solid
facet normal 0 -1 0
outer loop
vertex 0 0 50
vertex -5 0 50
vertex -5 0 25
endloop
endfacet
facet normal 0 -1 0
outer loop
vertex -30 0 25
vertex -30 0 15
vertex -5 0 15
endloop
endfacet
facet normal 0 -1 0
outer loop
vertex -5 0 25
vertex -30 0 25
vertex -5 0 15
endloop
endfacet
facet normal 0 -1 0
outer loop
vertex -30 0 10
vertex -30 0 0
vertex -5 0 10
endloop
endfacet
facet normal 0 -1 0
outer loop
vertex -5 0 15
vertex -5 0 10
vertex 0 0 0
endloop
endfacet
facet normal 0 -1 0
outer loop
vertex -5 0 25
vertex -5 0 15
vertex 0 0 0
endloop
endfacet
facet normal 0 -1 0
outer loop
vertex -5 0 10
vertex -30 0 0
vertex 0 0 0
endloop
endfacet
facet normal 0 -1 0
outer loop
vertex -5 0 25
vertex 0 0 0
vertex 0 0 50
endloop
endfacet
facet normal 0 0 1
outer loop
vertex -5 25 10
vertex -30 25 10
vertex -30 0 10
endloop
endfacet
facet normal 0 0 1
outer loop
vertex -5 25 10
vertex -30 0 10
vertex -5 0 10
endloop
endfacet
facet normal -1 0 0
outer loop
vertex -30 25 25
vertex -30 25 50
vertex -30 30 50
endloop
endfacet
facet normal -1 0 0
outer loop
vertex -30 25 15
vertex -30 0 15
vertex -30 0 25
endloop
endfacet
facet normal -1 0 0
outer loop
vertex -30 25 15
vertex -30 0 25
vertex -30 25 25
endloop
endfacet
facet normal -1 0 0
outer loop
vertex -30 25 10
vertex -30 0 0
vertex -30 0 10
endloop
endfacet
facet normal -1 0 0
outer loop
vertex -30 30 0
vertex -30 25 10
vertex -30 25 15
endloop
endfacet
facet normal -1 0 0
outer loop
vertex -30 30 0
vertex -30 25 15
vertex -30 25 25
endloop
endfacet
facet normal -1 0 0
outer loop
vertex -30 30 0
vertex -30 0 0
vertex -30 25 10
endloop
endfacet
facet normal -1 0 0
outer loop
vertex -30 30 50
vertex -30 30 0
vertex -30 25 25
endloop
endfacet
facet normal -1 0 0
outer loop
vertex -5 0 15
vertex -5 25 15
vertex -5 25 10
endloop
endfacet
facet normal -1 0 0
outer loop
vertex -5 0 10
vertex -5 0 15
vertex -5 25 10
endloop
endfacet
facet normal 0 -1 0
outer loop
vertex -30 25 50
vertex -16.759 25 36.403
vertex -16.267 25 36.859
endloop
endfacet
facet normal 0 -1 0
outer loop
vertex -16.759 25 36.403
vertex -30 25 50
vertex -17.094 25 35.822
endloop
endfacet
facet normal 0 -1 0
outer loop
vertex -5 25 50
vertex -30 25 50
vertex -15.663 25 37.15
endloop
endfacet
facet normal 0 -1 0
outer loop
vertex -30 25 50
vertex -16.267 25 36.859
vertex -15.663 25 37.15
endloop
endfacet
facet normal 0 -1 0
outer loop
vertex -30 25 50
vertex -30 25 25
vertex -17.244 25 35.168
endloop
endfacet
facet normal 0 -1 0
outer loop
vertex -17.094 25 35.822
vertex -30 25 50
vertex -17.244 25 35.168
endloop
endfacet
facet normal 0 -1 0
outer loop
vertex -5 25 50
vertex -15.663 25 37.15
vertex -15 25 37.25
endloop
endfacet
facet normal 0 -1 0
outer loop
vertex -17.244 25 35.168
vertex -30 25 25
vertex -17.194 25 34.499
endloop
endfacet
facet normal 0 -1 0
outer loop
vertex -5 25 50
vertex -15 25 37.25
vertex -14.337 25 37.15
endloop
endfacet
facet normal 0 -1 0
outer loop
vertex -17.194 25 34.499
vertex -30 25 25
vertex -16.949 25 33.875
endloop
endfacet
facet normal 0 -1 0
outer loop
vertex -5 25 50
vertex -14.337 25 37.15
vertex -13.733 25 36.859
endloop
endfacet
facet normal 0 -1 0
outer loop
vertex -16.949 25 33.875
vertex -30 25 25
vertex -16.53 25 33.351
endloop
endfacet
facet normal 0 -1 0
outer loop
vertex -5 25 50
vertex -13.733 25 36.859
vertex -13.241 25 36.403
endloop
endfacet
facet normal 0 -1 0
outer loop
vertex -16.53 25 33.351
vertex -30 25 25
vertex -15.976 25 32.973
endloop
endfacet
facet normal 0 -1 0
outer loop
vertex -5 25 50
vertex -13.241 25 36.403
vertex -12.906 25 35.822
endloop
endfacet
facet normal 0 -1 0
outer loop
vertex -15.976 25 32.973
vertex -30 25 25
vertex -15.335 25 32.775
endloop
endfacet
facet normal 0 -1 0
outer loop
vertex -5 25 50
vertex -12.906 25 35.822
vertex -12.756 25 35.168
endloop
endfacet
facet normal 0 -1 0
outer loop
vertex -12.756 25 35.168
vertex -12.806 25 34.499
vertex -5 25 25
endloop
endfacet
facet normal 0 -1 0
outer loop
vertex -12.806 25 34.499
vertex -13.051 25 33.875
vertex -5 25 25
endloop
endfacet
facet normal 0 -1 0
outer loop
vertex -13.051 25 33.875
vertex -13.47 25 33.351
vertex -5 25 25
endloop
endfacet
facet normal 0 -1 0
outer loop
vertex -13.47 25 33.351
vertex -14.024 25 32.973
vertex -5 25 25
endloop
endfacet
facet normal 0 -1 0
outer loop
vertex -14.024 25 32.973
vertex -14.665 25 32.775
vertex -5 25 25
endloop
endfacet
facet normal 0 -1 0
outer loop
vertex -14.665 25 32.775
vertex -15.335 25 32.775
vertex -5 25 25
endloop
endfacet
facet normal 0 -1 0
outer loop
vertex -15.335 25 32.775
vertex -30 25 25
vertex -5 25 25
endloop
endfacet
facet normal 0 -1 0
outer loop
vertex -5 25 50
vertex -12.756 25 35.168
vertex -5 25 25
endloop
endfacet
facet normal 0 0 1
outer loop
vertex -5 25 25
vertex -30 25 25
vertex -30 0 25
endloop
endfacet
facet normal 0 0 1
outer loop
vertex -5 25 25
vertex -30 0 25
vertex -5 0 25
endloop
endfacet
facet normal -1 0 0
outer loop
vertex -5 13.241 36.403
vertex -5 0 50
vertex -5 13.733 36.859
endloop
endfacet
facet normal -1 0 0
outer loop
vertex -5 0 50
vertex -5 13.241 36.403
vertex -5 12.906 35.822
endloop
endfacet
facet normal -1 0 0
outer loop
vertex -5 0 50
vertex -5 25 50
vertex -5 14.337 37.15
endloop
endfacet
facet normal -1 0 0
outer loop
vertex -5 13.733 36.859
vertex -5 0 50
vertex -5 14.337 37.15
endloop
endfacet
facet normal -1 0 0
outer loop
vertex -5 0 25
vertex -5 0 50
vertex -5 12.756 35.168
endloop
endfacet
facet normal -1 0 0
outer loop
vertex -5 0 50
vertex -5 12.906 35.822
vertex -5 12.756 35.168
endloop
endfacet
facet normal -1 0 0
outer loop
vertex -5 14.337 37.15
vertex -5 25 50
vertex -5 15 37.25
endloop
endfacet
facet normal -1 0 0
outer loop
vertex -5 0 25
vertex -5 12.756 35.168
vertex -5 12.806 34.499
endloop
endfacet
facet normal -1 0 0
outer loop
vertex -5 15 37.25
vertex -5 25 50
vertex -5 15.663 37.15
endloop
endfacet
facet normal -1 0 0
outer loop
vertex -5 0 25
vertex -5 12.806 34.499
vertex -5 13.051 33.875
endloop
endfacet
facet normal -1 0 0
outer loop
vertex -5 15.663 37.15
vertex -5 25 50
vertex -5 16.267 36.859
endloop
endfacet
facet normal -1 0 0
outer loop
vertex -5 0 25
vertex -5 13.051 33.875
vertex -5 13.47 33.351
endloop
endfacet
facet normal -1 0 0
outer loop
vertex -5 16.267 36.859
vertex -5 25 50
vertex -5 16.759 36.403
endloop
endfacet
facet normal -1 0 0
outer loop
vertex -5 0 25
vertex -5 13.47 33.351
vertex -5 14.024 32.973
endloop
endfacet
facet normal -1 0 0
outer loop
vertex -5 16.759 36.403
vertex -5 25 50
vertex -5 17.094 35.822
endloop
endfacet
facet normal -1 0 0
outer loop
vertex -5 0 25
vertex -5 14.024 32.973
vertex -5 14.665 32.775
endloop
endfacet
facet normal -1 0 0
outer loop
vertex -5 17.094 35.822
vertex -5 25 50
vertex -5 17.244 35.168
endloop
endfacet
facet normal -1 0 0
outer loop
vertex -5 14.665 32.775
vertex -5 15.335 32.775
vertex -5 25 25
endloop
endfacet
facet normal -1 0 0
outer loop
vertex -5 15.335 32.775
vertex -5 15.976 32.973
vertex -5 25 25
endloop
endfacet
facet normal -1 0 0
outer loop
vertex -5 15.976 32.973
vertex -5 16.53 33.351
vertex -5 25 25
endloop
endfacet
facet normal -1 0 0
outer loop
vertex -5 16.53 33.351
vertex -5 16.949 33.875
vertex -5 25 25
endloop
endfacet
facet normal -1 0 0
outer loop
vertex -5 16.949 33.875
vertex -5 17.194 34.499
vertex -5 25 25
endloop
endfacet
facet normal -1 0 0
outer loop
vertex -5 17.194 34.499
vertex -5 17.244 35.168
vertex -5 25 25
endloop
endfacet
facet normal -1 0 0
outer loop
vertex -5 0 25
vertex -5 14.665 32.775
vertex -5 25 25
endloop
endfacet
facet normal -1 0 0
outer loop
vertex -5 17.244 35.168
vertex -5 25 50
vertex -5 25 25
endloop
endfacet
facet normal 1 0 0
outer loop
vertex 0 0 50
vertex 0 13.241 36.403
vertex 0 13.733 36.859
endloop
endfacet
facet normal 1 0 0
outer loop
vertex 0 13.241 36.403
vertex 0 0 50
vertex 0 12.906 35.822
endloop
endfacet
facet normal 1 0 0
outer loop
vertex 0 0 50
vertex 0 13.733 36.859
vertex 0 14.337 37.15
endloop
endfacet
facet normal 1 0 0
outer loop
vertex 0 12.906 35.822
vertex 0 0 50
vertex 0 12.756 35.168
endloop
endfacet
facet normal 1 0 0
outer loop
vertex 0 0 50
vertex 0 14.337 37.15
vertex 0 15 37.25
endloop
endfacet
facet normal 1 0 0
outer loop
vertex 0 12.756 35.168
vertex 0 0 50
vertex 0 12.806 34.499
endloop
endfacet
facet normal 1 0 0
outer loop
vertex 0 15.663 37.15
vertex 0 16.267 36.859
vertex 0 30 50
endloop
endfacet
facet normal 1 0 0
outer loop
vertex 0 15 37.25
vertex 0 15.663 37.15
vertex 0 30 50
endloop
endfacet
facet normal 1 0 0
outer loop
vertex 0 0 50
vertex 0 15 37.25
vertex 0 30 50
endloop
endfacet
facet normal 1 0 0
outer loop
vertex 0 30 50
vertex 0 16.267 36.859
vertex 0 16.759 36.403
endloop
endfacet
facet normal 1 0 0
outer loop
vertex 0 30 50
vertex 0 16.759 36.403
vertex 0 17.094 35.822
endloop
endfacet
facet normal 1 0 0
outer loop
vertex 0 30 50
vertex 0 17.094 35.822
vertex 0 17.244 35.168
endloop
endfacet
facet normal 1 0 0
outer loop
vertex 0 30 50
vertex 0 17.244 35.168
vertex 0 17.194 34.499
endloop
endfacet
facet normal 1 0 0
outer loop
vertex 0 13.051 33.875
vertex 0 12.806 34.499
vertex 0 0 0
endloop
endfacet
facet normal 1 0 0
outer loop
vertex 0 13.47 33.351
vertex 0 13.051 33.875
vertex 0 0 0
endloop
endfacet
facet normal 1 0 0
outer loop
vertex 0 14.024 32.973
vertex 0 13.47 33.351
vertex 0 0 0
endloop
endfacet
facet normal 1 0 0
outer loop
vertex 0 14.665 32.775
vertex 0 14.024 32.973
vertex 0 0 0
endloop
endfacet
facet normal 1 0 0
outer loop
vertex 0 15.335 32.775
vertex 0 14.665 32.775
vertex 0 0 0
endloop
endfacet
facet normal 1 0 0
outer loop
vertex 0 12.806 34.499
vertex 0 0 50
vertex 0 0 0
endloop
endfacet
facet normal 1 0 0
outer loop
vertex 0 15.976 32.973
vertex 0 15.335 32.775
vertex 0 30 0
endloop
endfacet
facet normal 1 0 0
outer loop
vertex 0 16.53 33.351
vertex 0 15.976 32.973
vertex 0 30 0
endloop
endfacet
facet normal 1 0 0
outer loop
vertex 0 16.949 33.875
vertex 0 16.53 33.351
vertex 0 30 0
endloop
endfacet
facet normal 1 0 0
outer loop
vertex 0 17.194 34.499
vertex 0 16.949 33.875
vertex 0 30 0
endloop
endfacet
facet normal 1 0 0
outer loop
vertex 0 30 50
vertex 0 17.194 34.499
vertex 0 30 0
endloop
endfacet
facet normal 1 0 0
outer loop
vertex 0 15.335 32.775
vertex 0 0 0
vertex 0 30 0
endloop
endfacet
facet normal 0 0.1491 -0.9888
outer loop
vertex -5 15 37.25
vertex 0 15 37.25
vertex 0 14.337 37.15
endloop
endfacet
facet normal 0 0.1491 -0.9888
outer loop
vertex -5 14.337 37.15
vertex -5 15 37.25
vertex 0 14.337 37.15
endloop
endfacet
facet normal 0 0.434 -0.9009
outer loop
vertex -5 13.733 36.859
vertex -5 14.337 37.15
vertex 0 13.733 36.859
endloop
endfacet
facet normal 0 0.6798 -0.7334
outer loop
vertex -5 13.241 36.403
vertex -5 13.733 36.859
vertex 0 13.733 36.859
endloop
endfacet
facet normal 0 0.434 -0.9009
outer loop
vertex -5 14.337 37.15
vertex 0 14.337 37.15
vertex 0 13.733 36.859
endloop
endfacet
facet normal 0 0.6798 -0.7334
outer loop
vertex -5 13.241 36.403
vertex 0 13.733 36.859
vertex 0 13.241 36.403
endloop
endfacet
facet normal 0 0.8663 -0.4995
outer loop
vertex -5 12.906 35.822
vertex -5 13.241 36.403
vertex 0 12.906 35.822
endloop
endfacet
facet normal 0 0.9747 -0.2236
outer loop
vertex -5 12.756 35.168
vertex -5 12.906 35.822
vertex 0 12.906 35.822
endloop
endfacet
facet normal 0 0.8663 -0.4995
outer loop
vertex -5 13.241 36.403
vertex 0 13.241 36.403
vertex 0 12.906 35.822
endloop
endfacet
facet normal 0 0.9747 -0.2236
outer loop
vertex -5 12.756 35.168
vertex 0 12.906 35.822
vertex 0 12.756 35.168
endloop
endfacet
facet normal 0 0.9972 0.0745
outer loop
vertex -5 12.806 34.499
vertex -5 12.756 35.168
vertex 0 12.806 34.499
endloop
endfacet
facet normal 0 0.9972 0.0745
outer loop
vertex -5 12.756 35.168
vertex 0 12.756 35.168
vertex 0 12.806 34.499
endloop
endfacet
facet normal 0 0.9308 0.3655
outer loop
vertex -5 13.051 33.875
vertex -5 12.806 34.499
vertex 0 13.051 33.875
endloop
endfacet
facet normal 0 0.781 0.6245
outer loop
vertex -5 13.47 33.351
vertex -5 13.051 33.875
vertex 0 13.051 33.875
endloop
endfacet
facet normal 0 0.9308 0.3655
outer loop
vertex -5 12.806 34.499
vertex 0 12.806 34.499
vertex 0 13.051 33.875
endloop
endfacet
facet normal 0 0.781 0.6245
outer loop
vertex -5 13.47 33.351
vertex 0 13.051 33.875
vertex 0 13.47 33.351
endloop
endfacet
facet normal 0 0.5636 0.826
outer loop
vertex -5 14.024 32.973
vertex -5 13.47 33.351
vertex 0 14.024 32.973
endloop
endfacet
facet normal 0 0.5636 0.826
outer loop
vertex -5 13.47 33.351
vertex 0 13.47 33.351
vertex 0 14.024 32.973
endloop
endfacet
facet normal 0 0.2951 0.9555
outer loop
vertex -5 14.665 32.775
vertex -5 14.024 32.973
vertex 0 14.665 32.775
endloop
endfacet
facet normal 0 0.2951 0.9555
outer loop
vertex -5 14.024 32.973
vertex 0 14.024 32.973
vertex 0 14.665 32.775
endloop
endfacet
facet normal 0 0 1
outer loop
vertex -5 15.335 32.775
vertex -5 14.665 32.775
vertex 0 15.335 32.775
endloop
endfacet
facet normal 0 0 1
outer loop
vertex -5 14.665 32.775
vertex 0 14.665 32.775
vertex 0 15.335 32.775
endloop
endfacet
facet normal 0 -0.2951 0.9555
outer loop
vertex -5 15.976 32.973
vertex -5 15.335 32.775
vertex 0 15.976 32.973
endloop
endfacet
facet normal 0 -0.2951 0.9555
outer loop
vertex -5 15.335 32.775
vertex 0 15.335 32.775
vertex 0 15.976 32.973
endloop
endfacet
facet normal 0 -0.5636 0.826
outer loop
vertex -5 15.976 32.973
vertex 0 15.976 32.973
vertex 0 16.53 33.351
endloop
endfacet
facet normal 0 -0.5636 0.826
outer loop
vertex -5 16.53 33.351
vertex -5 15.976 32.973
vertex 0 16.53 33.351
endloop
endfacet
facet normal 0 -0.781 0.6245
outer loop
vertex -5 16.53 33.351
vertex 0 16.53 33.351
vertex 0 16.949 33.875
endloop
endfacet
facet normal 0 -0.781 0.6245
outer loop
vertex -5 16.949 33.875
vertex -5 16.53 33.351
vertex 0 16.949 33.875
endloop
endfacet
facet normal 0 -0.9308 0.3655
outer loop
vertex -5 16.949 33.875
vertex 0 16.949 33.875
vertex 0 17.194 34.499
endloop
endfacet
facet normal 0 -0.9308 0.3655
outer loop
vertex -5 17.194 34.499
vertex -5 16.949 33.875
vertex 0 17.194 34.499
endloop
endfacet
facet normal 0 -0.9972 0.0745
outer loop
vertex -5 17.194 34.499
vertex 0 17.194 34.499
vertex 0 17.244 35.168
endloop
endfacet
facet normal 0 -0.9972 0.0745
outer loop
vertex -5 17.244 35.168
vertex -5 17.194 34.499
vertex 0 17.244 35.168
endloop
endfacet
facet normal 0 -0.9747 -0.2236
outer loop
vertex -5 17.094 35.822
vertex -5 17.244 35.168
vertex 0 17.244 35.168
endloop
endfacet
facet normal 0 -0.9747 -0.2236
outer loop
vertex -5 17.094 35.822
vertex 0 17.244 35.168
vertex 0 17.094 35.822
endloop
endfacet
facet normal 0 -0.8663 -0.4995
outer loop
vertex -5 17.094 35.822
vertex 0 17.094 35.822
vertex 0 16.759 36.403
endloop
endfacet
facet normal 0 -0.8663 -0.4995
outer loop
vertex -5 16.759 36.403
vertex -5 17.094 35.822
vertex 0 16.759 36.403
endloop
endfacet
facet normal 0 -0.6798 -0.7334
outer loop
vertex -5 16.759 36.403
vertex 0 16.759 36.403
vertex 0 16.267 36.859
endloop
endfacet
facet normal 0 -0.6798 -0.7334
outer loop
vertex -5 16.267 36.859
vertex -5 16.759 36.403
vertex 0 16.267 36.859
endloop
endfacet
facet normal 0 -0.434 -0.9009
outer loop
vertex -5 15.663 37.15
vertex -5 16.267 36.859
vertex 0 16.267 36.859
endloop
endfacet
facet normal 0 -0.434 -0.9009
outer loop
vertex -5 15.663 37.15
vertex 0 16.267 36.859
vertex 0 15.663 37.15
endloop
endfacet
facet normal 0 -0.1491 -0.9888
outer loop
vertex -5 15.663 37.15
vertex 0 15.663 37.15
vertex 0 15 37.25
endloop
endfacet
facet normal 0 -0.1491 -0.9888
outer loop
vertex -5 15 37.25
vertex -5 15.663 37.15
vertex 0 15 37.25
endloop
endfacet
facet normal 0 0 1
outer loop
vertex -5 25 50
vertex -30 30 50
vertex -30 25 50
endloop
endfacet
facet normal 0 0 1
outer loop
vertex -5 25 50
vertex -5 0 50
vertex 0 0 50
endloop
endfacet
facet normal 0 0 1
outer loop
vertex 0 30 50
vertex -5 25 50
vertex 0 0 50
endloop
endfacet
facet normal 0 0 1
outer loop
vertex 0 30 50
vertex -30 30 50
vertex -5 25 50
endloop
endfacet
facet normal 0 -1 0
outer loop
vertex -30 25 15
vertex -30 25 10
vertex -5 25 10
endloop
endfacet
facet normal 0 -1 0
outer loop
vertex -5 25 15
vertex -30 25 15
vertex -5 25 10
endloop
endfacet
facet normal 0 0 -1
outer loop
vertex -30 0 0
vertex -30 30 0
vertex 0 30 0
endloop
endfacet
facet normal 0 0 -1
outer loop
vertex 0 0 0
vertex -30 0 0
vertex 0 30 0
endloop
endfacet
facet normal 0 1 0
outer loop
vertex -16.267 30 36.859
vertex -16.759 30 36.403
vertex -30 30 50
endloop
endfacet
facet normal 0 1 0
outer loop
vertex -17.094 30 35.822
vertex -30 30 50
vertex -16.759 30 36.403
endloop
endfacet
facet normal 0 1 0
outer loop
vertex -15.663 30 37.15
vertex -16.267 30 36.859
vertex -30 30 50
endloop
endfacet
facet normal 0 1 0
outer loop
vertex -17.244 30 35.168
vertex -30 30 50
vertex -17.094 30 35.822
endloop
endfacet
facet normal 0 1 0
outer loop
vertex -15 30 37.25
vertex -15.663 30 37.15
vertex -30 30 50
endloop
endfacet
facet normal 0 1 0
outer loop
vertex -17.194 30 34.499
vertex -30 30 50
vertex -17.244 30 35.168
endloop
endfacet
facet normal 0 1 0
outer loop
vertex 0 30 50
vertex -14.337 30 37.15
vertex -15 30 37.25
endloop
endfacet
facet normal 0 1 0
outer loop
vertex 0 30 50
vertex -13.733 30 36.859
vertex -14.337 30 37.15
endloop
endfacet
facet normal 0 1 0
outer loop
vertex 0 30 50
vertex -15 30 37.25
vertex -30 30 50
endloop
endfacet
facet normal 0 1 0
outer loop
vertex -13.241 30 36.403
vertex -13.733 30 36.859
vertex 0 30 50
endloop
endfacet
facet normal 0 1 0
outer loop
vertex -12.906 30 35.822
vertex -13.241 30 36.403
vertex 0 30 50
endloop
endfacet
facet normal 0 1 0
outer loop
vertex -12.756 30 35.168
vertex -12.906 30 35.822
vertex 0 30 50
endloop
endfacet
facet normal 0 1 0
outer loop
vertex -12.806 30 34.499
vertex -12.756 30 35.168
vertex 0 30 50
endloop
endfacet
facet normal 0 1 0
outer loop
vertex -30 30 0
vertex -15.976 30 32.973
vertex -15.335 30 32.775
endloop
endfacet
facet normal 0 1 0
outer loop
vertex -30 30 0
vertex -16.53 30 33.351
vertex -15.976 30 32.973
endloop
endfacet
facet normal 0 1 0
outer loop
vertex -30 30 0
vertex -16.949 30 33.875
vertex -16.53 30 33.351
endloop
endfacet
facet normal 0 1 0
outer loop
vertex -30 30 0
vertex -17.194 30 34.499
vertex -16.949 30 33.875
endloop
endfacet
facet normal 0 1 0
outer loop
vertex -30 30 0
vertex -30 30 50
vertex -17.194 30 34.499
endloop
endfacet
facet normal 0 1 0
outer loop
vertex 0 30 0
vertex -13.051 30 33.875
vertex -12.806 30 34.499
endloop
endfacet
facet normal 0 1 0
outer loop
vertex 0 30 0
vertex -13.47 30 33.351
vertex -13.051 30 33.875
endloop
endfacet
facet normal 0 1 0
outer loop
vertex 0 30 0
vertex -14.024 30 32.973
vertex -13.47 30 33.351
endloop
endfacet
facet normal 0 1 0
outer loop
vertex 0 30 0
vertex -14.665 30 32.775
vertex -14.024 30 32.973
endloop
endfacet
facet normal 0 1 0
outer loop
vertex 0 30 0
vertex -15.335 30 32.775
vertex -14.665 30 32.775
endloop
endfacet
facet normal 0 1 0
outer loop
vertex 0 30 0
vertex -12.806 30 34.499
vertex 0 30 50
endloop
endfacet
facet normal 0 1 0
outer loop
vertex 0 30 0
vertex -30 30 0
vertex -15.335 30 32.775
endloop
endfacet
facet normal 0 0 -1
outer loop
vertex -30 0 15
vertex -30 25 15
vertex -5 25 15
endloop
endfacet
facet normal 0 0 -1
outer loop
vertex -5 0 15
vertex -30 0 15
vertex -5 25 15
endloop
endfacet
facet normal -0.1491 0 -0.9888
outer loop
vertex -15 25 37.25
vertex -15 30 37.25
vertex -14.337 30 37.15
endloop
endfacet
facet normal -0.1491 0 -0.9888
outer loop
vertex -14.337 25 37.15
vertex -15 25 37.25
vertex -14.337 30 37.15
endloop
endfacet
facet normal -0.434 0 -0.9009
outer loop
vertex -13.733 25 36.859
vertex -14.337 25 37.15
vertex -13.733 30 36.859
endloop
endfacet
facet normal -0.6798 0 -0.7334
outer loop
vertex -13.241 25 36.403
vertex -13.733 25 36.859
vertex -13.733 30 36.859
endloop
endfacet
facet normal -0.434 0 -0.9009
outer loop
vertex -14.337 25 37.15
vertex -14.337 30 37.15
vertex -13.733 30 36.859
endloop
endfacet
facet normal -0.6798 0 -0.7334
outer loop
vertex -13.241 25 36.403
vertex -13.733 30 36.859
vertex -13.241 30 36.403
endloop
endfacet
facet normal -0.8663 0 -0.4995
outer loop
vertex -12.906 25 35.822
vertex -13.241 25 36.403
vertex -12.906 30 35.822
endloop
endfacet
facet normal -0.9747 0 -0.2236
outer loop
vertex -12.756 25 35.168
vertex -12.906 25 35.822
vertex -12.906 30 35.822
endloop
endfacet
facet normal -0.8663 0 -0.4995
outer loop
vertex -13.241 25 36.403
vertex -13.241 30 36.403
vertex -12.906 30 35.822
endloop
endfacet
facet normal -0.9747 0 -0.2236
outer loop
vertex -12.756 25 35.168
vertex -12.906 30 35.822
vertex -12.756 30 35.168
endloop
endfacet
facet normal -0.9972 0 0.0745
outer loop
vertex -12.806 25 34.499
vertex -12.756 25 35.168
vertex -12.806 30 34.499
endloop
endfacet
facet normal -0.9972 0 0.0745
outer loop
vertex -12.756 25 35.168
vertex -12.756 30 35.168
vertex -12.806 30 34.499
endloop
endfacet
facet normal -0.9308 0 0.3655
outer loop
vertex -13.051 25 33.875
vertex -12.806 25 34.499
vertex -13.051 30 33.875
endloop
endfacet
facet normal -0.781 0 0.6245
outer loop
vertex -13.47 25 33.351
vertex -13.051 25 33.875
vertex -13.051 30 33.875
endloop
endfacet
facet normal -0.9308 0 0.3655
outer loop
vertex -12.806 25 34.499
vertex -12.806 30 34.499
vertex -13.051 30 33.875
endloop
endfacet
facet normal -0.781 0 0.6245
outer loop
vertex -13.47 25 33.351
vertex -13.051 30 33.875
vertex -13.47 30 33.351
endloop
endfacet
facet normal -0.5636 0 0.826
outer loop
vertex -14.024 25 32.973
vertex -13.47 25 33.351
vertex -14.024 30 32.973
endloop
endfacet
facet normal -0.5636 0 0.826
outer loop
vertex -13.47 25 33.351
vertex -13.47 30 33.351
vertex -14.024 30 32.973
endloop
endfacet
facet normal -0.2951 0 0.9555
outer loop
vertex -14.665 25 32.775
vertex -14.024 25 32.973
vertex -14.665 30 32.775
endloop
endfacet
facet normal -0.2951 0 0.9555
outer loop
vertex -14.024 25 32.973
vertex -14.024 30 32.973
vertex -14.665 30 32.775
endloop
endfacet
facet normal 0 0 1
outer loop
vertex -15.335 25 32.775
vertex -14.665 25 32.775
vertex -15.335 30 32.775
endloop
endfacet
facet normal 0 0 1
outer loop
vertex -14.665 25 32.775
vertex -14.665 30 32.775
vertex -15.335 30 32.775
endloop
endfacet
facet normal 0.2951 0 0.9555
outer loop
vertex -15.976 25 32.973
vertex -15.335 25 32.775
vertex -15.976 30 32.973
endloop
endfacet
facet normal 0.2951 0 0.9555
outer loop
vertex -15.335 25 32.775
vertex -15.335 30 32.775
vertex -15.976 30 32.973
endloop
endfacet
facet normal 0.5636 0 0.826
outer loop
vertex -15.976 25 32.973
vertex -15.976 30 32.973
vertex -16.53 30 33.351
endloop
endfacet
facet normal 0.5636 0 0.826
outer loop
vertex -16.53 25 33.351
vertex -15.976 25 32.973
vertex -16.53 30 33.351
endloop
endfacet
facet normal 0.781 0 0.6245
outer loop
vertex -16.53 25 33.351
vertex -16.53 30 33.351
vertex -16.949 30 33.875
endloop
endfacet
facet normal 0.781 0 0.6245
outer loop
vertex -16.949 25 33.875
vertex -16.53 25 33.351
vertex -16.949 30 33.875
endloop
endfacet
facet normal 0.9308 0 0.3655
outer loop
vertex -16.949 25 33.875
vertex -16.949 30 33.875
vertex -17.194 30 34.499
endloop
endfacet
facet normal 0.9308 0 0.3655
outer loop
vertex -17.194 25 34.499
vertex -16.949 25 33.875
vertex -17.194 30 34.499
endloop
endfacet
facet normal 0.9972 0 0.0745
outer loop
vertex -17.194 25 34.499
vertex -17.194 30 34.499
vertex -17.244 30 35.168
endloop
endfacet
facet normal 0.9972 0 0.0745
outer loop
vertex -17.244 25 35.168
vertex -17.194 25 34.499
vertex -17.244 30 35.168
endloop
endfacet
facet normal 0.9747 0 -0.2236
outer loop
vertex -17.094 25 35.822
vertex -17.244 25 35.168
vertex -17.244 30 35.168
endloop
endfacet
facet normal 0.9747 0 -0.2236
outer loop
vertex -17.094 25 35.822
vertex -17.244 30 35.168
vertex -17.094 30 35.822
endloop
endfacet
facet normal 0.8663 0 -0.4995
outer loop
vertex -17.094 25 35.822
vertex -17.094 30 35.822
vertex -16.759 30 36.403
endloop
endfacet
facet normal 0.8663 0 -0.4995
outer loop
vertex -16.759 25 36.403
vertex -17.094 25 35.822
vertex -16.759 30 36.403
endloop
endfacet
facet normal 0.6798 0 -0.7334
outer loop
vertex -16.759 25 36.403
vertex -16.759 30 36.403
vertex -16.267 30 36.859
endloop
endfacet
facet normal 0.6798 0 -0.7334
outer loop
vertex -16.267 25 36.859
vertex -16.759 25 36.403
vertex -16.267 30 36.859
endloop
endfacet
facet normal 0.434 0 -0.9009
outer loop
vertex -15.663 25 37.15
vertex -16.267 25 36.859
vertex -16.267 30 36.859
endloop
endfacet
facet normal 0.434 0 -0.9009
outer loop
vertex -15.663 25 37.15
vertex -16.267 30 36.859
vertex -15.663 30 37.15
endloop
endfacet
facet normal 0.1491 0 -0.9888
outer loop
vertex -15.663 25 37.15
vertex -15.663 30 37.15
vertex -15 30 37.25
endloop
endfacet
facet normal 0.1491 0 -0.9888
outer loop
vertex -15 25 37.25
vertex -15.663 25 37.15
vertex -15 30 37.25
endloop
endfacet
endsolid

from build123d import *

# Parameters (mm, degrees)
ESBO_O1_W                         = 30
ESBO_O1_H                         = 30
RESSALTO_EXTRUS_O1_DEPTH          = 50
CORTE_EXTRUS_O1_START             = -5
ESBO_O2_W                         = 25
ESBO_O2_H                         = 5
CORTE_EXTRUS_O1_DEPTH             = 26
CORTE_EXTRUS_O2_START             = -5
ESBO_O3_W                         = 25
ESBO_O3_H                         = 25
CORTE_EXTRUS_O2_DEPTH             = 26
FURO_COM_FOLGA_DE_M41_D           = 4.5
FURO_COM_FOLGA_DE_M41_ON_FACE_2_D = 4.5


with BuildPart() as part:
    # Esboço1 → Ressalto-extrusão1 (new body)
    with BuildSketch(Plane.XY):
        with Locations((-15, 15)):
            Rectangle(ESBO_O1_W, ESBO_O1_H)
    extrude(amount=RESSALTO_EXTRUS_O1_DEPTH)

    # Esboço2 → Corte-extrusão1 (cut, through all)
    with BuildSketch(Plane(origin=(0, 30, 0), x_dir=(1, 0, 0), z_dir=(0, 1, 0)).offset(CORTE_EXTRUS_O1_START)):
        with Locations((-17.5, -12.5)):
            Rectangle(ESBO_O2_W, ESBO_O2_H)
    extrude(amount=-CORTE_EXTRUS_O1_DEPTH, mode=Mode.SUBTRACT)

    # Esboço3 → Corte-extrusão2 (cut, through all)
    with BuildSketch(Plane(origin=(0, 30, 0), x_dir=(1, 0, 0), z_dir=(0, 1, 0)).offset(CORTE_EXTRUS_O2_START)):
        with Locations((-17.5, -37.5)):
            Rectangle(ESBO_O3_W, ESBO_O3_H)
    extrude(amount=-CORTE_EXTRUS_O2_DEPTH, mode=Mode.SUBTRACT)

    # Furo com folga de M41 (through all)
    with Locations(Plane(origin=(-5, 15, 35), x_dir=(0, 0, -1), z_dir=(-1, 0, 0))):
        with Locations((0, 0)):
            Hole(FURO_COM_FOLGA_DE_M41_D / 2)

    # Furo com folga de M41 on face 2 (through all)
    with Locations(Plane(origin=(-15, 25, 35), x_dir=(0, 0, -1), z_dir=(0, -1, 0))):
        with Locations((0, 0)):
            Hole(FURO_COM_FOLGA_DE_M41_ON_FACE_2_D / 2)


solid = part.part
